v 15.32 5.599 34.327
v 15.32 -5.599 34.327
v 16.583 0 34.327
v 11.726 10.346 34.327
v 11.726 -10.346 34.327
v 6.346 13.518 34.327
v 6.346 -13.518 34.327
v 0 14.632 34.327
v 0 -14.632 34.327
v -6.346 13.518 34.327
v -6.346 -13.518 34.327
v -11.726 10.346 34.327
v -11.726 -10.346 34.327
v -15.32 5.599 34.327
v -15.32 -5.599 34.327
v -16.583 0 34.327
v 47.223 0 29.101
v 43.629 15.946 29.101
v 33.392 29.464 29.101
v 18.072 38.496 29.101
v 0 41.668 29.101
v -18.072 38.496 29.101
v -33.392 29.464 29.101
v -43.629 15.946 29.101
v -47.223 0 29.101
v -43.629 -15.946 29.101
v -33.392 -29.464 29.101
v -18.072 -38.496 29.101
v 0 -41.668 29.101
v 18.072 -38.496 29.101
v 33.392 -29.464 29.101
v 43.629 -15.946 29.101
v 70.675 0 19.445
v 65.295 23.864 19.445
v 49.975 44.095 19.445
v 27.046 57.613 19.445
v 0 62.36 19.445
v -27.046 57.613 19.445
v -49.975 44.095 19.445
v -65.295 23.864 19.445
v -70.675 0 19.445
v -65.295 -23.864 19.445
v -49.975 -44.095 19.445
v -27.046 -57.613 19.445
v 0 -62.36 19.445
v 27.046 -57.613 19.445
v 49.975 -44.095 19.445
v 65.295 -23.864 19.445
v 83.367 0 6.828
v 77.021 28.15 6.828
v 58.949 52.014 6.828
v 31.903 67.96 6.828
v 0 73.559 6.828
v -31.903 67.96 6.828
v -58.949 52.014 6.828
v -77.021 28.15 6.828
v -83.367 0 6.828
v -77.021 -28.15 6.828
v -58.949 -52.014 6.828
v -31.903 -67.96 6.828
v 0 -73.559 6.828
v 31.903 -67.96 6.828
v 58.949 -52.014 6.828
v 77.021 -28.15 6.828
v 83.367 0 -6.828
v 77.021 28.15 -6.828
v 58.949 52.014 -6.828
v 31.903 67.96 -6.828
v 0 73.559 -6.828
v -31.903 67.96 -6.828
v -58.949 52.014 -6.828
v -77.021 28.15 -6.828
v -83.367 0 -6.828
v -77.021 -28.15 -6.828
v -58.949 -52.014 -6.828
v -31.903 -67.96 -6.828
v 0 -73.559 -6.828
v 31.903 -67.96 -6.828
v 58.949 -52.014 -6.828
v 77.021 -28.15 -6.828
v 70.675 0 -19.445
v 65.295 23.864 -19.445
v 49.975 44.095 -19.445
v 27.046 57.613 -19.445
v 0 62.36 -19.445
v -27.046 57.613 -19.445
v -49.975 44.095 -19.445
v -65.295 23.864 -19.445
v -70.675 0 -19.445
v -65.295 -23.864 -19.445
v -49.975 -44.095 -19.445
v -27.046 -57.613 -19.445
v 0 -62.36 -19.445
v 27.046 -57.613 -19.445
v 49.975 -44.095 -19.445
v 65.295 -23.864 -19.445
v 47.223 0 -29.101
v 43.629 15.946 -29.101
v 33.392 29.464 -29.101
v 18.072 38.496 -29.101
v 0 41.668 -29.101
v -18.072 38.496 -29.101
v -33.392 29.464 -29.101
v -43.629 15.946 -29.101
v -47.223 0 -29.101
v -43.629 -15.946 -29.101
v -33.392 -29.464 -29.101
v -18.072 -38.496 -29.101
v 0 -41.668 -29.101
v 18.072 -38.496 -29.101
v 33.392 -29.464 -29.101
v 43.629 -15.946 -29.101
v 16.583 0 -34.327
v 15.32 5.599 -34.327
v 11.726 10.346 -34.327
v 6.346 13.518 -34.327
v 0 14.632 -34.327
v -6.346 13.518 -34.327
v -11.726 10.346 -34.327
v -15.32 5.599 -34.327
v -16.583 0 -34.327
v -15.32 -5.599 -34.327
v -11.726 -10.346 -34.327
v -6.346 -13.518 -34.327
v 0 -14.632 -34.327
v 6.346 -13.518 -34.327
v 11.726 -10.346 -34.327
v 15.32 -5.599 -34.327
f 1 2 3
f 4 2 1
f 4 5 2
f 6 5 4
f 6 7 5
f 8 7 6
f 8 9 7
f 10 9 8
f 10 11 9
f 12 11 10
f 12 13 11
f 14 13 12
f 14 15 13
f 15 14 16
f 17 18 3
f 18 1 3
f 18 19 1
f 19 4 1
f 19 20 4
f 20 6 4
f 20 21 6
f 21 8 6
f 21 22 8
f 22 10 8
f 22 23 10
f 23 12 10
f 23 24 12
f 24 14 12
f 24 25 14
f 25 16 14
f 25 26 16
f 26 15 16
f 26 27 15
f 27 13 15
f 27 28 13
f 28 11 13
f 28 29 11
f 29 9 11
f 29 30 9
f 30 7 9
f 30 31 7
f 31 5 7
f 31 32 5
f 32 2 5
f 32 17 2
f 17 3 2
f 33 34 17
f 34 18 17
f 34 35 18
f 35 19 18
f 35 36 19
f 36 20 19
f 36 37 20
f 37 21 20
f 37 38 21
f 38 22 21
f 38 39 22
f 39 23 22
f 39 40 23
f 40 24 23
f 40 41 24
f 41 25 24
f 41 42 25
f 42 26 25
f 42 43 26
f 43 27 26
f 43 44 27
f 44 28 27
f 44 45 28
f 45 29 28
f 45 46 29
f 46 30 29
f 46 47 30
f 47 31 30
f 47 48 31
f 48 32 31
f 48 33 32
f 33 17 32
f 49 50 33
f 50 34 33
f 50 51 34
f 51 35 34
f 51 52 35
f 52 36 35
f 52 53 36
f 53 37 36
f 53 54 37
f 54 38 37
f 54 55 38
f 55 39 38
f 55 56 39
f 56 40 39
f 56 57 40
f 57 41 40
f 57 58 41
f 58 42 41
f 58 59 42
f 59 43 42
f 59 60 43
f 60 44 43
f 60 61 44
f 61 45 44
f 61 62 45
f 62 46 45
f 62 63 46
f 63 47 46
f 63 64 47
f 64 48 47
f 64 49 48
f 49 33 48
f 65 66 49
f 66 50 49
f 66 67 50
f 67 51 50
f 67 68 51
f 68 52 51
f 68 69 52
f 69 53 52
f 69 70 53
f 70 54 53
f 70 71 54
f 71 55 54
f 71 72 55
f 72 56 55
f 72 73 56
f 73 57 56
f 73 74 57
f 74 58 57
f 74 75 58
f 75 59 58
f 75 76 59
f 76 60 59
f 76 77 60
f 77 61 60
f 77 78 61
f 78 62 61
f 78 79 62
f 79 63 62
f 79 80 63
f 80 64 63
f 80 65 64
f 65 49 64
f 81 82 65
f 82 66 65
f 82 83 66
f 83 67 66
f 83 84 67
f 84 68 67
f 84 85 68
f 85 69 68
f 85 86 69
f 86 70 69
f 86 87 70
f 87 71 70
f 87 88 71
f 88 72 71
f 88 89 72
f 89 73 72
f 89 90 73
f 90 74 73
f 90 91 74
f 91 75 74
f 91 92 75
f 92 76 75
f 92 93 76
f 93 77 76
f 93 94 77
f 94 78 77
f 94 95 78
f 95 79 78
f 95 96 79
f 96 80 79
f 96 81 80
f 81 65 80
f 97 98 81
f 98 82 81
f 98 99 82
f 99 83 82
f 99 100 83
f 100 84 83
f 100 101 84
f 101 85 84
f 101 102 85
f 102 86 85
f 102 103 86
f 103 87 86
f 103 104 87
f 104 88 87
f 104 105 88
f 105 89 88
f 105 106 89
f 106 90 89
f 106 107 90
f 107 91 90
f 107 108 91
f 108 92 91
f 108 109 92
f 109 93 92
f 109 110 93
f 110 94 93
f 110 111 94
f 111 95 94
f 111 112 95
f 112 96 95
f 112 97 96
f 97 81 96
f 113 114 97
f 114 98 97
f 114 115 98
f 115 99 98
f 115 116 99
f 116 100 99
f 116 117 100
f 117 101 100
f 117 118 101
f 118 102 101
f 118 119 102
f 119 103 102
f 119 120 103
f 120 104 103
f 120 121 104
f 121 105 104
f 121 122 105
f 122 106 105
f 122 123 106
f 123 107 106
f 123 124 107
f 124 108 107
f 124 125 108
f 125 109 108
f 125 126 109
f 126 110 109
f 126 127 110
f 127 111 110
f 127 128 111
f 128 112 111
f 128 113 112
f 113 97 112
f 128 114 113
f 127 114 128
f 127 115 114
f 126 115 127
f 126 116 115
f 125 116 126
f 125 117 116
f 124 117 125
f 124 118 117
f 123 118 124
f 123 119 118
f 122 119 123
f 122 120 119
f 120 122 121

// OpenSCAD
// Generated by SolidPython 1.0.1 on 2020-07-29 00:46:53


scale(v = [17, 15, 7]) {
	sphere(r = 5);
}
/***********************************************
*********      SolidPython code:      **********
************************************************
 
# import packages: SolidPython
from solid import *
from solid.utils import *
from itertools import chain, combinations, permutations


class Resize:

    def __init__(self, scad_file):
        self.scad_file = scad_file
        #self.scad_file = import_scad(scad_file)
        # cone/cylinder param:
        self.r1 = 0
        self.r2 = 0
        self.h = 0
        # rectangular prism param:
        self.w = 0
        self.l = 0
        # ellipse param:
        self.r = 0

    # import OpenScad code (file name corresponds to shape)


    # classify shape + parameters
    def assign(self, param1, param2, param3):
        if self.scad_file == 'cone.scad':
            self.r1 = param1
            self.r2 = param2
            self.h = param3
        elif self.scad_file == 'cylinder.scad':
            self.r1 = param1
            self.r2 = param2
            self.h = param3
        elif self.scad_file == 'rectangularPrism.scad':
            self.h = param1
            self.l = param2
            self.w = param3
        else:
            self.r = param1
            self.h = param2

    # resize parameters
    def iterate(self):
        x = range(3, 20, 2)
        i = 1
        if self.scad_file == 'cone.scad':
            tempList = list(permutations(x, 2))
            for temp in tempList:
                param1 = temp[0]
                param2 = temp[1]
                filepath = 'produced_scad_files/' + 'cone' + str(param1) + '_' + str(param2) + '_' + '.scad'
                scad_render_to_file(cylinder(h=param1, r1=param2, r2=0), filepath)

        elif self.scad_file == 'cylinder.scad':
            tempList = list(permutations(x, 3))
            for temp in tempList:
                param1 = temp[0]
                param2 = temp[1]
                filepath = 'produced_scad_files/' + 'cylinder' + str(param1) + '_' + str(param2) + '_' + '.scad'
                scad_render_to_file(cylinder(h=param1, r1=param2, r2=param2), filepath)

        elif self.scad_file == 'rectangularPrism.scad':
            tempList = list(permutations(x, 3))
            for temp in tempList:
                param1 = temp[0]
                param2 = temp[1]
                param3 = temp[2]
                filepath = 'produced_scad_files/' + 'rectangularPrism' + str(param1) + '_' + str(param2) + '_' + str(
                    param3) + '.scad'
                scad_render_to_file(cube(size=(param1, param2, param3)), filepath)

        elif self.scad_file == 'ellipse.scad':
            tempList = list(permutations(x, 4))
            for temp in tempList:
                param1 = temp[0]
                param2 = temp[1]
                param3 = temp[2]
                param4 = temp[3]
                filepath = 'produced_scad_files/' + 'ellipse' + str(param1) + '_' + str(param2) + '_' + str(param3) + '_' + str(param4) + '.scad'
                scad_render_to_file(scale([param1, param2, param3])(sphere(r=param4)), filepath)

    def render_to_scadfile(self):
        scad_render_to_file(scad, 'example.scad') 
 
************************************************/
